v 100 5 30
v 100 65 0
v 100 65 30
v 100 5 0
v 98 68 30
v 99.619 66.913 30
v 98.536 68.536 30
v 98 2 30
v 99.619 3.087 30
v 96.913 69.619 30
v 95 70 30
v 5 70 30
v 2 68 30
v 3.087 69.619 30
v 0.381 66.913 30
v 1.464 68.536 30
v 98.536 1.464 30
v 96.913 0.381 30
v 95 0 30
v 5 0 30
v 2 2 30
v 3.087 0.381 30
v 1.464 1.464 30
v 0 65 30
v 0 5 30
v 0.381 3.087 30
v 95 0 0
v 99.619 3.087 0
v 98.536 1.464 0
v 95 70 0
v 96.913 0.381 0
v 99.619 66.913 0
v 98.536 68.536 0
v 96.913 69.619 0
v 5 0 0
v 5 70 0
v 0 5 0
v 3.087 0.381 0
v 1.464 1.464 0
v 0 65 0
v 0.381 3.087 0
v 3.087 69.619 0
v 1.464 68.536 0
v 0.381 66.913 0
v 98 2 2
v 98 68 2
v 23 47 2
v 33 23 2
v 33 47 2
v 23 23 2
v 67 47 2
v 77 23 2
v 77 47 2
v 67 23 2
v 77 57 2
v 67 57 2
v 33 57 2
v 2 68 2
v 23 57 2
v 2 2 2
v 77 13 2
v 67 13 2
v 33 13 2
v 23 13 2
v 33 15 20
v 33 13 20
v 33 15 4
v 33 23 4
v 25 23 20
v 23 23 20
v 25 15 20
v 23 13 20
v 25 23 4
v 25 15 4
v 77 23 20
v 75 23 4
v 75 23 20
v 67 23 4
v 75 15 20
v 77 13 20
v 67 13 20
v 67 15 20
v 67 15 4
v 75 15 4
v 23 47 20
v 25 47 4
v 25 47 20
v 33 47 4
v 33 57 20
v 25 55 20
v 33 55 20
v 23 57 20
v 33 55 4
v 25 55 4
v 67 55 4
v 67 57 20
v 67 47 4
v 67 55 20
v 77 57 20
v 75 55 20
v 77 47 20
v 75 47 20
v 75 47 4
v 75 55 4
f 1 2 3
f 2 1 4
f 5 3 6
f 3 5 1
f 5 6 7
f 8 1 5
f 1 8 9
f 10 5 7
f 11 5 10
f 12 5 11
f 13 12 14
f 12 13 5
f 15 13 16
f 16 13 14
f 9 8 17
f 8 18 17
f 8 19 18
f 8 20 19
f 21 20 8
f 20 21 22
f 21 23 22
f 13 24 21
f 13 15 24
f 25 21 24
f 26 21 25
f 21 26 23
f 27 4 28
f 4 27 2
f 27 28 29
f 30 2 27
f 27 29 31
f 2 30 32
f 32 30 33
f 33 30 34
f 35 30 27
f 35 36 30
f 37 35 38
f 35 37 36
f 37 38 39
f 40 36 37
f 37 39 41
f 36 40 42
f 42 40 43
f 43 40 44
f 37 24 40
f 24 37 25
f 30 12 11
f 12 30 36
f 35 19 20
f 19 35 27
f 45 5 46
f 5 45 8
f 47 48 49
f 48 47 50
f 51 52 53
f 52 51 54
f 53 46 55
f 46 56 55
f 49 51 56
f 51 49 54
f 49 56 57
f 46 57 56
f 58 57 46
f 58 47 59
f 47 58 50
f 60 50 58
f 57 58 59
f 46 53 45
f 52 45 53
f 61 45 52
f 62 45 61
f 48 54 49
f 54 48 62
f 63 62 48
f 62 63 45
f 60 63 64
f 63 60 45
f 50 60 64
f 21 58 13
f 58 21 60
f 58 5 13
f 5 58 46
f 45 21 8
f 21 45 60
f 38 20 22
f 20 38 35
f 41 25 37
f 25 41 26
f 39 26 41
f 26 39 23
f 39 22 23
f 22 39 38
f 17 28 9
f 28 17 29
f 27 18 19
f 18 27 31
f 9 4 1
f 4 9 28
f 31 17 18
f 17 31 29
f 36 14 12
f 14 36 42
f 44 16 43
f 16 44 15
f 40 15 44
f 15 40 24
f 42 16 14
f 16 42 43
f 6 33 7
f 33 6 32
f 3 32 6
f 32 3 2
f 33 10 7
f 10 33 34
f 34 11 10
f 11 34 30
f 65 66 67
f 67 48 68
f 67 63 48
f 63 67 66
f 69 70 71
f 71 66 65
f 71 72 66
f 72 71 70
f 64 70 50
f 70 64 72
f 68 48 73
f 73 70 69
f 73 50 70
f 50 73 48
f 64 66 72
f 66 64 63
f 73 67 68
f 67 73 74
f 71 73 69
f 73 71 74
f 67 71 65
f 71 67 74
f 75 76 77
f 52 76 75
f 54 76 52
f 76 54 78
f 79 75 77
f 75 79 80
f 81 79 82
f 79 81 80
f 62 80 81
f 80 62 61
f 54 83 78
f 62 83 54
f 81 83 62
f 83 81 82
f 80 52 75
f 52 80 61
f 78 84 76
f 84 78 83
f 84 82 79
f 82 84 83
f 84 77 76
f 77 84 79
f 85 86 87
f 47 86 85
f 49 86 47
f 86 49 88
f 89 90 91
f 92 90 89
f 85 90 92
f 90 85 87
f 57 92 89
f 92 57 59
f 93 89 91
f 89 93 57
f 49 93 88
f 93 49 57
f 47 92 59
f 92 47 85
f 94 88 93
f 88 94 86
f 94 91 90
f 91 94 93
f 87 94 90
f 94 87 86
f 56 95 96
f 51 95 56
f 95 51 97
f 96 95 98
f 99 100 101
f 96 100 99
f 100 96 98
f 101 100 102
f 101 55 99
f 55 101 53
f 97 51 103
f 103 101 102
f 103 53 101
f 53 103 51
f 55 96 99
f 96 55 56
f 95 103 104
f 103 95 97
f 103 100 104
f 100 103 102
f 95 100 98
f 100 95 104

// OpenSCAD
box(100, 70, 30, 2, 5, 2);
translate([25, 15, 0])
pillars(50, 40, 10, 20, 4, 0.8);
*translate([0, 0, 30])
cap(100, 70, 2, 5, 3, 5, 2, 0.4);



module box(L, W, HBox, T, extPinRad, intPinRad, needInternalPins)
{
	difference()
	{
		union()
		{
			difference()
			{
				cube([L, W, HBox]);
				translate([T, T, T])
				cube([L - 2 * T, W - 2 * T, HBox]);
			}
			for (edge = [0 : 3]) pinEdgePlacer(edge, HBox, extPinRad, intPinRad, 0, T, 0, L, W, 0, 0); //Цилиндр по четырём углам
		}
		//Вырез оставшихся треугольников по четырём углам.
		for (edge = [0 : 3]) excessTriangle(edge, HBox, extPinRad, L, W);
		if (!needInternalPins)
		{
			//Вырез внутренних цилиндров по четырём углам.
			for(edge = [0 : 3]) cutInternalPins(edge, HBox, extPinRad, L, W, T);
		}
	}
}

module cap(L, W, T, HCapExt, HCapInt, extPinRad, intPinRad, capGap, boxHasInternalPins)
{
	difference()
	{
		difference()
		{
			union()
			{
				cube([L, W, HCapExt]);
			}
			for (edge = [0 : 3]) pinEdgePlacer(edge, HCapExt, extPinRad, intPinRad, 0, 0, 2, L, W, 0, 0); //Цилиндр по четырём углам
		}
		for (edge = [0 : 3]) excessTriangle(edge, HCapExt, extPinRad, L, W); //Вырез оставшихся треугольников по четырём углам.
	}
	difference()
	{
		translate([T + capGap, T + capGap, -HCapInt]) //Часть крышки, что заходит внутрь.
		cube([L - 2 * (T + capGap), W - 2 * (T + capGap), HCapInt]);
		if (boxHasInternalPins)
		{
			translate([0, 0, -HCapInt])
			for (edge = [0 : 3]) pinEdgePlacer(edge, HCapInt, extPinRad + capGap, 0, 0, 0, 1, L, W, 0, 0);
		}
	}
}

//Размещает пины (цилиндры с дыркой) по 4-м сторонам прямоугольника, заданного width, length, x, y. Угол задаётся edge.
//Размеры прямоугольника соответствуют краям цилиндров с радиусом er.
//Если радиуса er не достаточно, то можно увеличить его добавкой addToExtRad. Это увеличит внешний радиус без смещения центра пина.
module pinEdgePlacer(edge, hh, er, ir, addToExtRad, holeFromBottom, pinSelect, length, width, deltaX, deltaY)
{
	x = (edge == 1 || edge == 3) ? length - er : er;
	y = (edge == 2 || edge == 3) ? width - er : er;
	translate([x + deltaX, y + deltaY, 0])
	pin(pinSelect, er + addToExtRad, ir, hh, holeFromBottom);
}

//Пины для прикручивания (цилиндры с дыркой).
module pin(pinSelect, er, ir, hh, holeFromBottom) //pinSelect: 0 - цилиндр с дыркой, 1 - только цилиндр, 2 - только дырка в виде цилиндра.
{
	difference()
	{
		if (pinSelect == 0 || pinSelect == 1) cylinder(r = er, h = hh);
		if (pinSelect == 0 || pinSelect == 2)
		{
			translate([0, 0, holeFromBottom])
			cylinder(r = ir, h = hh - holeFromBottom);
		}
	}
}

//Вырез оставшихся треугольников по четырём углам.
module excessTriangle(edge, hh, er, L, W)
{
	xCyl = (edge == 1 || edge == 3) ? L - er : er;
	yCyl = (edge == 2 || edge == 3) ? W - er : er;
	xCube = (edge == 1 || edge == 3) ? L - er: 0;
	yCube = (edge == 2 || edge == 3) ? W - er : 0;
	difference()
	{
		translate([xCube, yCube, 0])
		cube([er, er, hh]);
		translate([xCyl, yCyl, 0])
		cylinder(r = er, h = hh);
	}
}

module cutInternalPins(edge, hh, er, L, W, T)
{
	xCube = (edge == 1 || edge == 3) ? L - T - er * 2 : T;
	yCube = (edge == 2 || edge == 3) ? W - T - er * 2 : T;
	translate([xCube, yCube, T])
	cube([er * 2, er * 2, hh]);
}

//Столбики с вырезом - держалки для чего-либо.
module pillar(wPillar, hPillar, hFromPlate, cut)
{
	difference()
	{
		cube([wPillar, wPillar, hPillar]);
		translate([wPillar * (1 - cut), wPillar * (1 - cut), hFromPlate])
		cube([wPillar * cut, wPillar * cut, hPillar - hFromPlate]);
	}
}

//Размещает столбики-держалки по четырём углам.
module pillars(L, W, wPillar, hPillar, hFromPlate, cut) //W - по x ширина, L - по y длина - расстояние между стойками
{
	delta = (1 - cut) * wPillar;
	render()
	for (edge = [0 : 3])
	{
		x = (edge == 1 || edge == 3) ? L + delta : 0 - delta;
		y = (edge == 2 || edge == 3) ? W + delta : 0 - delta;
		alpha = (edge == 0 ? 0 : (edge == 1 ? 90 : (edge == 2 ? -90 : 180)));
		translate([x, y, 0])
		rotate([0, 0, alpha])
		pillar(wPillar, hPillar, hFromPlate, cut);
	}
}

//Делает скруглённые отверстия.
module roundedHole(L, W, H)
{
	linear_extrude(height = H)
	hull()
	{
		translate([W / 2, 0, 0])
		circle(d = W);
		translate([L - W / 2, 0, 0])
		circle(d = W);
	}
}
